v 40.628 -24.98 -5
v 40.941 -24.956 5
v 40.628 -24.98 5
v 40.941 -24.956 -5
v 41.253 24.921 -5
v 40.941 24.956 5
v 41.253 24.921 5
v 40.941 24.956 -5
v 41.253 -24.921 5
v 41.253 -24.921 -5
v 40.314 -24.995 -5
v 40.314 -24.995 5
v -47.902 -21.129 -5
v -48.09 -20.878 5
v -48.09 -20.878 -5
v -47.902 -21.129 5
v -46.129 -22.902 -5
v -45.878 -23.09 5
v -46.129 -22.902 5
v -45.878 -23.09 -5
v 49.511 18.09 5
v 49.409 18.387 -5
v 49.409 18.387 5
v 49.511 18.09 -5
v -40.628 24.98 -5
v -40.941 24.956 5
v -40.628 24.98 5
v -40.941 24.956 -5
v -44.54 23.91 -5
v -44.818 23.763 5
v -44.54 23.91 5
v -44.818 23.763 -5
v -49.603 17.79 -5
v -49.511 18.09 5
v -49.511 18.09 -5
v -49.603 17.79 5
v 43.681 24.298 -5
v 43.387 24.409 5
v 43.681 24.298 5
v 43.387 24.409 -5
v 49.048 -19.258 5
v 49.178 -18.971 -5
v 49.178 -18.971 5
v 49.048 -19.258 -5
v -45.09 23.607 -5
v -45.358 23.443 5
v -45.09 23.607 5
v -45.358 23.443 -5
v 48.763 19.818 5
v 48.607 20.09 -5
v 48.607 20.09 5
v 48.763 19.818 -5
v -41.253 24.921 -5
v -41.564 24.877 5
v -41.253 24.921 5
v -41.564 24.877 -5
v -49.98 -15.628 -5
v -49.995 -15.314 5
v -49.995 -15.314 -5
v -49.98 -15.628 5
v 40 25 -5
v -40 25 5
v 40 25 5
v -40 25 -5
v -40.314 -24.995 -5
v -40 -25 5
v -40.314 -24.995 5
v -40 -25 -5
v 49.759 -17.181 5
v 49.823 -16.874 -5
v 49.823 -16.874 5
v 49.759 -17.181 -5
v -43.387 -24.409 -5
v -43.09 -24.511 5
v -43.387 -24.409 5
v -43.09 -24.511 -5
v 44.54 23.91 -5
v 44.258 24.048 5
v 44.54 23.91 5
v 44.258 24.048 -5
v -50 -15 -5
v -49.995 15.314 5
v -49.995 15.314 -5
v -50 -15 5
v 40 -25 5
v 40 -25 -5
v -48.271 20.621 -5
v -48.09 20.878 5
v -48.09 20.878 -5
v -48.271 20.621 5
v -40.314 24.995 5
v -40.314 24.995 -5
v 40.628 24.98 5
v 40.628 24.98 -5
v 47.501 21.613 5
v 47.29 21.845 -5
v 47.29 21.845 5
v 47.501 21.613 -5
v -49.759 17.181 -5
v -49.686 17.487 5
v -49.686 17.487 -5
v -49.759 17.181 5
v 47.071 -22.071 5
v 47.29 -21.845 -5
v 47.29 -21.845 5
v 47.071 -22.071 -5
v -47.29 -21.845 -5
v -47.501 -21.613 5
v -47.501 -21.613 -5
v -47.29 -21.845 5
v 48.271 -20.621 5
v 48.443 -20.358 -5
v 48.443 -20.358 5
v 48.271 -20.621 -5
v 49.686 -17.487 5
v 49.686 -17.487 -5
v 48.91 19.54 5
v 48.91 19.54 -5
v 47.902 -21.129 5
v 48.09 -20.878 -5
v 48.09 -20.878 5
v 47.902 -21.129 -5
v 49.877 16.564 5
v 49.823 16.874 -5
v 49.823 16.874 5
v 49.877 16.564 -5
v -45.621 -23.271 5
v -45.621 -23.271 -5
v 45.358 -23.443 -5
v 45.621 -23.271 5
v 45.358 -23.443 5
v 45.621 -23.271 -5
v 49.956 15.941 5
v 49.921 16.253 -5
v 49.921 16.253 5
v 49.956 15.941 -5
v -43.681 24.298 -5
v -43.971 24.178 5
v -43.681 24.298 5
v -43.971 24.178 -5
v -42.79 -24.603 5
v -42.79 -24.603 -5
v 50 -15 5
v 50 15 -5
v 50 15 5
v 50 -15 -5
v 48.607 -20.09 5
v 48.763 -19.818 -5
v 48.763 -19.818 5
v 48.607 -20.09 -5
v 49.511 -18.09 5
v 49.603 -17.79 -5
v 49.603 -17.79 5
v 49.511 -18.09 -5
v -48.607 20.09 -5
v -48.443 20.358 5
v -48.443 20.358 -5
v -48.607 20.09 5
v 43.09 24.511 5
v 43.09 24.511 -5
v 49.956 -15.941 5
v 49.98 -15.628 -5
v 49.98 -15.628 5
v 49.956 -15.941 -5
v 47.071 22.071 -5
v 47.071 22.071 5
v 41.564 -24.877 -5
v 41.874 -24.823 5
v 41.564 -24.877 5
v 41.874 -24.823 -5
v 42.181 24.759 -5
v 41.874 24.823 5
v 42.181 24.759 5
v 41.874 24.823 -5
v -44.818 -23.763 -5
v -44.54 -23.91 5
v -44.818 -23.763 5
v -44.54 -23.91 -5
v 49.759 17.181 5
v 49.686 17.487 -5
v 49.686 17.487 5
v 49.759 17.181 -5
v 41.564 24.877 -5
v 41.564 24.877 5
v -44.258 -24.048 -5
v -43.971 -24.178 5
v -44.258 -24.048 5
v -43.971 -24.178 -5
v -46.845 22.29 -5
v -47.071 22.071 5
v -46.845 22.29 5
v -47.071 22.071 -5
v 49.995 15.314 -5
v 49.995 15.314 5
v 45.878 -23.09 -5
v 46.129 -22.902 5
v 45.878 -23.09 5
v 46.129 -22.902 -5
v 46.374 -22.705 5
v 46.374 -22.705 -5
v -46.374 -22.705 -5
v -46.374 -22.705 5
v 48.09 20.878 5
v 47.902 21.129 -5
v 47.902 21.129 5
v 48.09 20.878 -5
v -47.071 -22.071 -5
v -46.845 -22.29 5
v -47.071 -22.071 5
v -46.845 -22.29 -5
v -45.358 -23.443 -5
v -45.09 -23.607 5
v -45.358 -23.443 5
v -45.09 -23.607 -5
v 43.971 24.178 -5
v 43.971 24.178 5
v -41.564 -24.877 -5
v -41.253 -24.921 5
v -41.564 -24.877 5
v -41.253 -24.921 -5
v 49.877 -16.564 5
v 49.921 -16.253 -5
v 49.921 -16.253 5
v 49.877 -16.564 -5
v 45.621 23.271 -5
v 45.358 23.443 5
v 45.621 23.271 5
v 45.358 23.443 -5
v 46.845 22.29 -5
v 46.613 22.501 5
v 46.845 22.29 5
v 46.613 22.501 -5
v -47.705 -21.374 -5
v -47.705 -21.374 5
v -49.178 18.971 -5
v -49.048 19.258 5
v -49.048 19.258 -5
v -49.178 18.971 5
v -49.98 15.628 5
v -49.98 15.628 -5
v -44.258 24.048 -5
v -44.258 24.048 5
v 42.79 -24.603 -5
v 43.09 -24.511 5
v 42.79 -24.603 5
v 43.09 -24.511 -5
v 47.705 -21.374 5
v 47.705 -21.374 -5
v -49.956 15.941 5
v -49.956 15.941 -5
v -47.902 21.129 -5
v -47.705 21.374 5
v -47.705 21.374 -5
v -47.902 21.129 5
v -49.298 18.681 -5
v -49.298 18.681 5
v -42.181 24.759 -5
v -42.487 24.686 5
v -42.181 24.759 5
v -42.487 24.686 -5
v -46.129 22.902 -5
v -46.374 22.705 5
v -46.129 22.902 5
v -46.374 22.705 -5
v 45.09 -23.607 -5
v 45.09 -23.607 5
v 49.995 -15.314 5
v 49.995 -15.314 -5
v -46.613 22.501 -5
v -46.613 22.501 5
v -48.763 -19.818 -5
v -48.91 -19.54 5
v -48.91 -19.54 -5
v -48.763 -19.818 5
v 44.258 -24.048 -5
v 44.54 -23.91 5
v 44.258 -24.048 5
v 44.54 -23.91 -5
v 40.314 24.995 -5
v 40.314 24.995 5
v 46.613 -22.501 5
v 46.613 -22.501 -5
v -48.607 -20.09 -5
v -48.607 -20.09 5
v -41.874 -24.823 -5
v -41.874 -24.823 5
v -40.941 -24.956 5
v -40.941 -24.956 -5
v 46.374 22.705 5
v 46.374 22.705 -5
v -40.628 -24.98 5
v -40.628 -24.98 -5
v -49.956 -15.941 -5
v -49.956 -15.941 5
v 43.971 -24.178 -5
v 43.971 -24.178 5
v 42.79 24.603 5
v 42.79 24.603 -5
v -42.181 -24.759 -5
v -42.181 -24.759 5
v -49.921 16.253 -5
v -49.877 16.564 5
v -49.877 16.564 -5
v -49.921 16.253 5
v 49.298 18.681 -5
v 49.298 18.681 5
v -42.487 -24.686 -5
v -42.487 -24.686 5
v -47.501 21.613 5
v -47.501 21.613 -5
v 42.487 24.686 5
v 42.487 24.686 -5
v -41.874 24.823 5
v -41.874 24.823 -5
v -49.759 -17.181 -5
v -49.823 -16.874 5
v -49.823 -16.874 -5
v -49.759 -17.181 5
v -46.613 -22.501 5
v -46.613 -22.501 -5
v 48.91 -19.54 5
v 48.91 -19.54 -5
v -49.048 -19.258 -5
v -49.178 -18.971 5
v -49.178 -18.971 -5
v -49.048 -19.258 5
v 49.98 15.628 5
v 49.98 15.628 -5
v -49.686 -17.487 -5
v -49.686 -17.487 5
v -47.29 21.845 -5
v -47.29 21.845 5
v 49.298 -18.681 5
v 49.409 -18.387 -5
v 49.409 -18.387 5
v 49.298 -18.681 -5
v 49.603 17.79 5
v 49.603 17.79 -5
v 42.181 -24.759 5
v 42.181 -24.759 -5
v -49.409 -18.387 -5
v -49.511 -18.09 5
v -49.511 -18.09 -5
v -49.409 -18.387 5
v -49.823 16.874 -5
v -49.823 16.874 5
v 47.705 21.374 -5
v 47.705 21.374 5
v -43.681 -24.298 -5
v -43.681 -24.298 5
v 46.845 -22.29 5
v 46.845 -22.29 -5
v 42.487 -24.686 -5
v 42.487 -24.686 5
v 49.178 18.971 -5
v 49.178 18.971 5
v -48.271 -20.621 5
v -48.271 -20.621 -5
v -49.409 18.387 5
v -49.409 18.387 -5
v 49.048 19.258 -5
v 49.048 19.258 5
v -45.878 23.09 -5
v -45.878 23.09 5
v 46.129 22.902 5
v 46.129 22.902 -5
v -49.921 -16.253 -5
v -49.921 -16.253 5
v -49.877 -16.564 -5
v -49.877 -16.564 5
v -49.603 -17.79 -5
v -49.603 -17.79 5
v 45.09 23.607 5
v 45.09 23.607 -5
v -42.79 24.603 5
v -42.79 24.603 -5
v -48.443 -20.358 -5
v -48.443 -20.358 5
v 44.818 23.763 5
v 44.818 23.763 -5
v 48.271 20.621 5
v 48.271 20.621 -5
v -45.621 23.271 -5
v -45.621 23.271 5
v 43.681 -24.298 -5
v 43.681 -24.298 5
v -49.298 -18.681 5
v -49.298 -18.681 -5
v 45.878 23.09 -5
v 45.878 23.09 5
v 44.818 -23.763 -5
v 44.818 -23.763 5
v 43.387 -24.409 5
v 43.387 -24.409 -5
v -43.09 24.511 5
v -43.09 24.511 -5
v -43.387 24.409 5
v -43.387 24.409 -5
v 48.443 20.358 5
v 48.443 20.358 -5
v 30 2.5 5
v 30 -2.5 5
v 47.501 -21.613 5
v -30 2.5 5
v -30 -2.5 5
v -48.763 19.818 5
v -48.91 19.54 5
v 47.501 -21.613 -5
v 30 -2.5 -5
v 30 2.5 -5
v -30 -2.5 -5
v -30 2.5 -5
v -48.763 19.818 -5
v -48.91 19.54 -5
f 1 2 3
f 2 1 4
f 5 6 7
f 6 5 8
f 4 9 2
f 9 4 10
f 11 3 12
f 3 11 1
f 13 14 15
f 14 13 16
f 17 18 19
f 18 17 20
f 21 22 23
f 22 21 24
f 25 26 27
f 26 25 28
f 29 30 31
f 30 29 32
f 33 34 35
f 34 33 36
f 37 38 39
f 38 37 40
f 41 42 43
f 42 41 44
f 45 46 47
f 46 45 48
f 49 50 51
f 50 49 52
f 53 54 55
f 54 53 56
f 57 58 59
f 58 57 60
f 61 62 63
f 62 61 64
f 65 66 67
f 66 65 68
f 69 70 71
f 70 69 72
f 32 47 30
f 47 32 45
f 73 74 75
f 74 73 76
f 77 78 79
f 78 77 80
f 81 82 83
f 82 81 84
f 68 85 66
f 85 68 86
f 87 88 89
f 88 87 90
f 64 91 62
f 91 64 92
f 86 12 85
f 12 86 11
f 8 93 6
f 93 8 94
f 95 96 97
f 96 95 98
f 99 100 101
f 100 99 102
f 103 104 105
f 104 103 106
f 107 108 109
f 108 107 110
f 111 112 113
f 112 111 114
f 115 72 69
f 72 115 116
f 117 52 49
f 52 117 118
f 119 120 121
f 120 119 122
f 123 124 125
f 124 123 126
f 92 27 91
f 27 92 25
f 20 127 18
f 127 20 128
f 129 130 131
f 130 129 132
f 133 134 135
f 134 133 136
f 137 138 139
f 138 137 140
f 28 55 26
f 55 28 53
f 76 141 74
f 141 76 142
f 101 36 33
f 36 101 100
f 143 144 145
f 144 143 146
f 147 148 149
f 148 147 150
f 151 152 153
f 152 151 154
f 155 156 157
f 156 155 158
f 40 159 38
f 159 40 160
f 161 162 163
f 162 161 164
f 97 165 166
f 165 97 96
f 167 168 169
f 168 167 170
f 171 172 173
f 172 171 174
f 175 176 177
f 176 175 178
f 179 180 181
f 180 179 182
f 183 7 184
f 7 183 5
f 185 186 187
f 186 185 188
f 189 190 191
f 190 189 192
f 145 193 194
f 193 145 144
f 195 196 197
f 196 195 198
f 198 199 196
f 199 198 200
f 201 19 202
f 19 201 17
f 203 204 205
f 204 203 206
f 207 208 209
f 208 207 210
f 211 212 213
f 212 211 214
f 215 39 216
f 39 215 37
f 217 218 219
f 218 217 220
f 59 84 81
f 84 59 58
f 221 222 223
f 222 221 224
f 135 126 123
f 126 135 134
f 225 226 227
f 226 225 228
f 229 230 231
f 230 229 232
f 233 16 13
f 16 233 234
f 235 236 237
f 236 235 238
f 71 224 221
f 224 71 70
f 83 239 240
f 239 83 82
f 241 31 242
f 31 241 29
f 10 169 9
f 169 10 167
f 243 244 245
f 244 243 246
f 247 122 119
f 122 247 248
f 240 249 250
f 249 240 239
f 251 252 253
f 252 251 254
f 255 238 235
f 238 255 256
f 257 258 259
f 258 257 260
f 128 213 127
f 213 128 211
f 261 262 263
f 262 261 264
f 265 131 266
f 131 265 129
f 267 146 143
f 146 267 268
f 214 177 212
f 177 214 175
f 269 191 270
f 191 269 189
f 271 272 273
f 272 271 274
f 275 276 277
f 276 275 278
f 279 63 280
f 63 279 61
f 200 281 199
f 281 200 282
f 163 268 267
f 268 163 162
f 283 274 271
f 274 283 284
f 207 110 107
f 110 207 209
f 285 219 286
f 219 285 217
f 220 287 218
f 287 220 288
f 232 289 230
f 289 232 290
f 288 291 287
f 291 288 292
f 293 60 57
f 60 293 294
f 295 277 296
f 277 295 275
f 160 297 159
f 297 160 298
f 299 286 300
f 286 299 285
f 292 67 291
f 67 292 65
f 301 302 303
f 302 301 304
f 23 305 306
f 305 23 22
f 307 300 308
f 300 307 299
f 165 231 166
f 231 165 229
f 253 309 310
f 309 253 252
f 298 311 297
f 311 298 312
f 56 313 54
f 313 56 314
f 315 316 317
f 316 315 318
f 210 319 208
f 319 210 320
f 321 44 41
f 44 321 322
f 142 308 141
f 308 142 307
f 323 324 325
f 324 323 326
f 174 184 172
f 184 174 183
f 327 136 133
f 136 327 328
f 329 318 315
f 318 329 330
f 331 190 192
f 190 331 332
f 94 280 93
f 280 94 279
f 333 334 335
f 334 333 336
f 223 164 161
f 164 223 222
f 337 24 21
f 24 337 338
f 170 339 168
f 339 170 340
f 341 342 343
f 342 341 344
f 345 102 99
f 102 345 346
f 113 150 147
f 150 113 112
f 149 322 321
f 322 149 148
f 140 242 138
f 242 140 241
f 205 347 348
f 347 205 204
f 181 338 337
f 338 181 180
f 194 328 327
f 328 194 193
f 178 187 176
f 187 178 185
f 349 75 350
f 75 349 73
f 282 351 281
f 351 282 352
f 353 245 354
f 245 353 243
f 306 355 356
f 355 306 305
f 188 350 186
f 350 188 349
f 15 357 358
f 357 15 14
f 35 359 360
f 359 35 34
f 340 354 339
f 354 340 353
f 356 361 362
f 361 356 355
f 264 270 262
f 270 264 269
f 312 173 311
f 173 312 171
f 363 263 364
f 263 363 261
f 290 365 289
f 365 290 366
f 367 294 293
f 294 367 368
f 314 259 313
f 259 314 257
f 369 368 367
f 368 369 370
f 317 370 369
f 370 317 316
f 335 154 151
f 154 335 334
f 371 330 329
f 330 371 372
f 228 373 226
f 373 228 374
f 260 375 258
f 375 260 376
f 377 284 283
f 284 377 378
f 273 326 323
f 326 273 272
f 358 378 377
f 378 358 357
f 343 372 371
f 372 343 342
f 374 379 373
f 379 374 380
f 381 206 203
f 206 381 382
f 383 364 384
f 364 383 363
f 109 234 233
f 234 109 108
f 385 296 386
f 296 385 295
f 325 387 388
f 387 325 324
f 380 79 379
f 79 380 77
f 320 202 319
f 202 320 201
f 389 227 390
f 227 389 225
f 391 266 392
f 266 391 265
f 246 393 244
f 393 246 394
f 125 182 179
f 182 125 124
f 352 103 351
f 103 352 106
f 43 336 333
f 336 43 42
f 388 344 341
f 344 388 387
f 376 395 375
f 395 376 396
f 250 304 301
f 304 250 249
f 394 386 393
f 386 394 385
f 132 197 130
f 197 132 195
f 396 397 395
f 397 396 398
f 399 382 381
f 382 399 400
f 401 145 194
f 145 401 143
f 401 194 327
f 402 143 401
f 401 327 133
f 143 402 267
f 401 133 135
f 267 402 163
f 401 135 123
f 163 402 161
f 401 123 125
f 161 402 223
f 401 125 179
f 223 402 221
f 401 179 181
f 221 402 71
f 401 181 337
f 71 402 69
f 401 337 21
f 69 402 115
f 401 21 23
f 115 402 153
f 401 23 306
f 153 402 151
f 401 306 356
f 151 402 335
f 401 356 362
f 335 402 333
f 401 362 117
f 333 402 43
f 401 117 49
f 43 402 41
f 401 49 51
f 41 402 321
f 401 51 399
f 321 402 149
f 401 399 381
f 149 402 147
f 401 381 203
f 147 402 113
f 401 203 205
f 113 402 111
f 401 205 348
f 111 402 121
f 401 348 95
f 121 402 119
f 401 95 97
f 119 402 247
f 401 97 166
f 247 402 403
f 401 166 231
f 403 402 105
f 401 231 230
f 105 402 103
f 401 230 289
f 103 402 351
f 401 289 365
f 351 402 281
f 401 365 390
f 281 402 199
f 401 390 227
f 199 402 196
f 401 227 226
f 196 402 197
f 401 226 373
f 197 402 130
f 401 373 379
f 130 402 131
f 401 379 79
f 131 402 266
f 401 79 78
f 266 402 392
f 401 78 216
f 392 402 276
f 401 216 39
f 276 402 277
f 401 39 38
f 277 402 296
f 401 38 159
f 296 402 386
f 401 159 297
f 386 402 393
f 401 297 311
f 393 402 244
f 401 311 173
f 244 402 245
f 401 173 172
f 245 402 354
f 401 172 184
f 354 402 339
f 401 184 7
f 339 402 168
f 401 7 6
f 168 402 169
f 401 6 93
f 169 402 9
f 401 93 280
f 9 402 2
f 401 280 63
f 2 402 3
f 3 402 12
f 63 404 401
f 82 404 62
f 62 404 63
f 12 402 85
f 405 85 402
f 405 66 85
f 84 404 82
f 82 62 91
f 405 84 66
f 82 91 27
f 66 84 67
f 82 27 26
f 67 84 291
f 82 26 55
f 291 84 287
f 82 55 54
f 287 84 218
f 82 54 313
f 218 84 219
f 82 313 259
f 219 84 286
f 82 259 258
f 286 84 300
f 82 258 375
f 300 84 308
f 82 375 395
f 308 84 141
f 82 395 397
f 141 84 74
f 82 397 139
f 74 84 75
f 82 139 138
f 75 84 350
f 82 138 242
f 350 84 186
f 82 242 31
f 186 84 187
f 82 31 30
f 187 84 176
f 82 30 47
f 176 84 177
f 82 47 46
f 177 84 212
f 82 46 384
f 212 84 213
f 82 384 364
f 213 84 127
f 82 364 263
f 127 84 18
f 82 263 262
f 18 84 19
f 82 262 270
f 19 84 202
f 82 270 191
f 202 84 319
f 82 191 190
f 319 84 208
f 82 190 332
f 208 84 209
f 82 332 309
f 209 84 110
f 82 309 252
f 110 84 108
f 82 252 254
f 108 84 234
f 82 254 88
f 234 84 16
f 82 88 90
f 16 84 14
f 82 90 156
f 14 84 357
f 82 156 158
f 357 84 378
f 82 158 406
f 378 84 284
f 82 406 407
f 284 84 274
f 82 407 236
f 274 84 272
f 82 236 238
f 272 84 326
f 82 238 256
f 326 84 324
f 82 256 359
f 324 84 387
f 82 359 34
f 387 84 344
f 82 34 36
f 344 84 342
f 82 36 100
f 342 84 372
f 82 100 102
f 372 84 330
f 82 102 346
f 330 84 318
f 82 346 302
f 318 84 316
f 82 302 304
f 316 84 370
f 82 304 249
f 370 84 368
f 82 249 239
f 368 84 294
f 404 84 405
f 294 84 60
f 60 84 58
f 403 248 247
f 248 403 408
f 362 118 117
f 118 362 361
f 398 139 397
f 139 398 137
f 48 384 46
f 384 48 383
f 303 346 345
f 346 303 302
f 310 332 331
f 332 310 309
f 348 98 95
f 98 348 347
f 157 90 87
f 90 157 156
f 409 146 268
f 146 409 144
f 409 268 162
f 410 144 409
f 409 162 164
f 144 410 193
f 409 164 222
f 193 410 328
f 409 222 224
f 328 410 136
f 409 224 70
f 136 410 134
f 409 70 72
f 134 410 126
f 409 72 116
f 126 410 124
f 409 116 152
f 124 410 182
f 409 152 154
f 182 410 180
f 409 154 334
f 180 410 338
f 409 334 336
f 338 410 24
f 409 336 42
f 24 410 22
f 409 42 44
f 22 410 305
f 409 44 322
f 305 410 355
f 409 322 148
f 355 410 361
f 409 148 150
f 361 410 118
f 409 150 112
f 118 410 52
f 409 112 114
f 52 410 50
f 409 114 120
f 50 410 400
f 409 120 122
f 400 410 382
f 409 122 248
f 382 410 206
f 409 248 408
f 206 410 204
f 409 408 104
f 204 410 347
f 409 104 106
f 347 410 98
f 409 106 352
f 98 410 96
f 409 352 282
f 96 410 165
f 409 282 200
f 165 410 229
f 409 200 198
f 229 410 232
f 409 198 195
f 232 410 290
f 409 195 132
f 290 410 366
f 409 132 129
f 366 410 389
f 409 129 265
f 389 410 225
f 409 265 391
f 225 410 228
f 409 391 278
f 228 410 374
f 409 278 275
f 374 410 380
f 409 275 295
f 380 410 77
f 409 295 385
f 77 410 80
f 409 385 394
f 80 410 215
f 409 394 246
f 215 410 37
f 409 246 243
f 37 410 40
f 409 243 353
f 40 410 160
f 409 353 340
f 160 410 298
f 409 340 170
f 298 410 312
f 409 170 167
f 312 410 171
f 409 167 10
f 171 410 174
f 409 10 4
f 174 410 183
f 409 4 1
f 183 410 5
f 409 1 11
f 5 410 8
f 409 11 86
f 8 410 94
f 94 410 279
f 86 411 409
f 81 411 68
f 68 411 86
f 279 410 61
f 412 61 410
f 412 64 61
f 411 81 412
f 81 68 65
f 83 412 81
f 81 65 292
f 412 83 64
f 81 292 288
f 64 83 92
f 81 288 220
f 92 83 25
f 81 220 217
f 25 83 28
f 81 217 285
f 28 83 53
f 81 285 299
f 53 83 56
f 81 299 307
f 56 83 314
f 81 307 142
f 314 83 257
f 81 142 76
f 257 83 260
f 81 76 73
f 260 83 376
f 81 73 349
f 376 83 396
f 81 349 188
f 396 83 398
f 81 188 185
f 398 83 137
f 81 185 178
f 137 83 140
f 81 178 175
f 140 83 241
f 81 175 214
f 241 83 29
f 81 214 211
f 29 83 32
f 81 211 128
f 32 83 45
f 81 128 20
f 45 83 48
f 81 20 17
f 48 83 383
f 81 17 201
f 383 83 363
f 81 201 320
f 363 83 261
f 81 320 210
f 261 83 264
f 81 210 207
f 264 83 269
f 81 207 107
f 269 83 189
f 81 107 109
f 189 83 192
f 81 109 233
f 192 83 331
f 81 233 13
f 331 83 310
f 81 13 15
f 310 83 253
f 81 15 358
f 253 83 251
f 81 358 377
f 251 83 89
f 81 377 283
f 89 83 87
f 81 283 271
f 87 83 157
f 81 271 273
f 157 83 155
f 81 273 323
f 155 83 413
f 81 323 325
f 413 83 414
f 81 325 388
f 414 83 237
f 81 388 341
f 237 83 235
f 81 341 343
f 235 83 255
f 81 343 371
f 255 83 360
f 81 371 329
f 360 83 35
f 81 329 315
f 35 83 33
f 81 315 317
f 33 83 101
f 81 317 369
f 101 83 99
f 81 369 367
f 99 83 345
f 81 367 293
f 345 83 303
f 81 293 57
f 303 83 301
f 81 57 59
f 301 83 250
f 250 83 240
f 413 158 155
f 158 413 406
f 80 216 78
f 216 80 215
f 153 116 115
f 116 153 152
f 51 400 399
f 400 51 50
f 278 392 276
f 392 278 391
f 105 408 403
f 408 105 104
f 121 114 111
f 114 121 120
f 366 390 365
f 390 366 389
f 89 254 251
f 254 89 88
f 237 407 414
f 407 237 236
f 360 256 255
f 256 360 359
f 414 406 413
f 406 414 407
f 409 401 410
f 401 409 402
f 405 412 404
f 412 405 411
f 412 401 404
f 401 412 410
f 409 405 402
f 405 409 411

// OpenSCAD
module round_rec( v, r, center = false, fn = 50 ){

//    cube( v, center = center );
    
    delta_x = center ? -v[ 0 ] / 2 : 0;
    delta_y = center ? -v[ 1 ] / 2 : 0;
    
    linear_extrude( height = v[ 2 ], center = center )
        polygon(
            points = [
                for ( i = [ 0 : fn - 1 ] )
                    [ r * cos( -180 + i / fn * 90 ) + r + delta_x, r * sin( -180 + i / fn * 90 ) + r + delta_y ],
                [ r + delta_x, 0 + delta_y ],
                for ( i = [ 0 : fn - 1 ] )
                    [ r * cos( -90 + i / fn * 90 ) + v[ 0 ] - r + delta_x, r * sin( -90 + i / fn * 90 ) + r + delta_y ],
                [ v[ 0 ] + delta_x, r + delta_y ],
                for ( i = [ 0 : fn - 1 ] )
                    [ r * cos( i / fn * 90 ) + v[ 0 ] - r + delta_x, r * sin( i / fn * 90 ) + v[ 1 ] - r + delta_y ],
                [ v[ 0 ] - r + delta_x, v[ 1 ] + delta_y ],
                for ( i = [ 0 : fn - 1 ] )
                    [ r * cos( 90 + i / fn * 90 ) + r + delta_x, r * sin( 90 + i / fn * 90 ) + v[ 1 ] - r + delta_y ],
                [ 0 + delta_x, r + delta_y ]
            ]
        );

}

difference(){
    round_rec( [ 100, 50, 10 ], 10, center = true );
    cube( [ 60, 5, 500 ], center = true );
}
